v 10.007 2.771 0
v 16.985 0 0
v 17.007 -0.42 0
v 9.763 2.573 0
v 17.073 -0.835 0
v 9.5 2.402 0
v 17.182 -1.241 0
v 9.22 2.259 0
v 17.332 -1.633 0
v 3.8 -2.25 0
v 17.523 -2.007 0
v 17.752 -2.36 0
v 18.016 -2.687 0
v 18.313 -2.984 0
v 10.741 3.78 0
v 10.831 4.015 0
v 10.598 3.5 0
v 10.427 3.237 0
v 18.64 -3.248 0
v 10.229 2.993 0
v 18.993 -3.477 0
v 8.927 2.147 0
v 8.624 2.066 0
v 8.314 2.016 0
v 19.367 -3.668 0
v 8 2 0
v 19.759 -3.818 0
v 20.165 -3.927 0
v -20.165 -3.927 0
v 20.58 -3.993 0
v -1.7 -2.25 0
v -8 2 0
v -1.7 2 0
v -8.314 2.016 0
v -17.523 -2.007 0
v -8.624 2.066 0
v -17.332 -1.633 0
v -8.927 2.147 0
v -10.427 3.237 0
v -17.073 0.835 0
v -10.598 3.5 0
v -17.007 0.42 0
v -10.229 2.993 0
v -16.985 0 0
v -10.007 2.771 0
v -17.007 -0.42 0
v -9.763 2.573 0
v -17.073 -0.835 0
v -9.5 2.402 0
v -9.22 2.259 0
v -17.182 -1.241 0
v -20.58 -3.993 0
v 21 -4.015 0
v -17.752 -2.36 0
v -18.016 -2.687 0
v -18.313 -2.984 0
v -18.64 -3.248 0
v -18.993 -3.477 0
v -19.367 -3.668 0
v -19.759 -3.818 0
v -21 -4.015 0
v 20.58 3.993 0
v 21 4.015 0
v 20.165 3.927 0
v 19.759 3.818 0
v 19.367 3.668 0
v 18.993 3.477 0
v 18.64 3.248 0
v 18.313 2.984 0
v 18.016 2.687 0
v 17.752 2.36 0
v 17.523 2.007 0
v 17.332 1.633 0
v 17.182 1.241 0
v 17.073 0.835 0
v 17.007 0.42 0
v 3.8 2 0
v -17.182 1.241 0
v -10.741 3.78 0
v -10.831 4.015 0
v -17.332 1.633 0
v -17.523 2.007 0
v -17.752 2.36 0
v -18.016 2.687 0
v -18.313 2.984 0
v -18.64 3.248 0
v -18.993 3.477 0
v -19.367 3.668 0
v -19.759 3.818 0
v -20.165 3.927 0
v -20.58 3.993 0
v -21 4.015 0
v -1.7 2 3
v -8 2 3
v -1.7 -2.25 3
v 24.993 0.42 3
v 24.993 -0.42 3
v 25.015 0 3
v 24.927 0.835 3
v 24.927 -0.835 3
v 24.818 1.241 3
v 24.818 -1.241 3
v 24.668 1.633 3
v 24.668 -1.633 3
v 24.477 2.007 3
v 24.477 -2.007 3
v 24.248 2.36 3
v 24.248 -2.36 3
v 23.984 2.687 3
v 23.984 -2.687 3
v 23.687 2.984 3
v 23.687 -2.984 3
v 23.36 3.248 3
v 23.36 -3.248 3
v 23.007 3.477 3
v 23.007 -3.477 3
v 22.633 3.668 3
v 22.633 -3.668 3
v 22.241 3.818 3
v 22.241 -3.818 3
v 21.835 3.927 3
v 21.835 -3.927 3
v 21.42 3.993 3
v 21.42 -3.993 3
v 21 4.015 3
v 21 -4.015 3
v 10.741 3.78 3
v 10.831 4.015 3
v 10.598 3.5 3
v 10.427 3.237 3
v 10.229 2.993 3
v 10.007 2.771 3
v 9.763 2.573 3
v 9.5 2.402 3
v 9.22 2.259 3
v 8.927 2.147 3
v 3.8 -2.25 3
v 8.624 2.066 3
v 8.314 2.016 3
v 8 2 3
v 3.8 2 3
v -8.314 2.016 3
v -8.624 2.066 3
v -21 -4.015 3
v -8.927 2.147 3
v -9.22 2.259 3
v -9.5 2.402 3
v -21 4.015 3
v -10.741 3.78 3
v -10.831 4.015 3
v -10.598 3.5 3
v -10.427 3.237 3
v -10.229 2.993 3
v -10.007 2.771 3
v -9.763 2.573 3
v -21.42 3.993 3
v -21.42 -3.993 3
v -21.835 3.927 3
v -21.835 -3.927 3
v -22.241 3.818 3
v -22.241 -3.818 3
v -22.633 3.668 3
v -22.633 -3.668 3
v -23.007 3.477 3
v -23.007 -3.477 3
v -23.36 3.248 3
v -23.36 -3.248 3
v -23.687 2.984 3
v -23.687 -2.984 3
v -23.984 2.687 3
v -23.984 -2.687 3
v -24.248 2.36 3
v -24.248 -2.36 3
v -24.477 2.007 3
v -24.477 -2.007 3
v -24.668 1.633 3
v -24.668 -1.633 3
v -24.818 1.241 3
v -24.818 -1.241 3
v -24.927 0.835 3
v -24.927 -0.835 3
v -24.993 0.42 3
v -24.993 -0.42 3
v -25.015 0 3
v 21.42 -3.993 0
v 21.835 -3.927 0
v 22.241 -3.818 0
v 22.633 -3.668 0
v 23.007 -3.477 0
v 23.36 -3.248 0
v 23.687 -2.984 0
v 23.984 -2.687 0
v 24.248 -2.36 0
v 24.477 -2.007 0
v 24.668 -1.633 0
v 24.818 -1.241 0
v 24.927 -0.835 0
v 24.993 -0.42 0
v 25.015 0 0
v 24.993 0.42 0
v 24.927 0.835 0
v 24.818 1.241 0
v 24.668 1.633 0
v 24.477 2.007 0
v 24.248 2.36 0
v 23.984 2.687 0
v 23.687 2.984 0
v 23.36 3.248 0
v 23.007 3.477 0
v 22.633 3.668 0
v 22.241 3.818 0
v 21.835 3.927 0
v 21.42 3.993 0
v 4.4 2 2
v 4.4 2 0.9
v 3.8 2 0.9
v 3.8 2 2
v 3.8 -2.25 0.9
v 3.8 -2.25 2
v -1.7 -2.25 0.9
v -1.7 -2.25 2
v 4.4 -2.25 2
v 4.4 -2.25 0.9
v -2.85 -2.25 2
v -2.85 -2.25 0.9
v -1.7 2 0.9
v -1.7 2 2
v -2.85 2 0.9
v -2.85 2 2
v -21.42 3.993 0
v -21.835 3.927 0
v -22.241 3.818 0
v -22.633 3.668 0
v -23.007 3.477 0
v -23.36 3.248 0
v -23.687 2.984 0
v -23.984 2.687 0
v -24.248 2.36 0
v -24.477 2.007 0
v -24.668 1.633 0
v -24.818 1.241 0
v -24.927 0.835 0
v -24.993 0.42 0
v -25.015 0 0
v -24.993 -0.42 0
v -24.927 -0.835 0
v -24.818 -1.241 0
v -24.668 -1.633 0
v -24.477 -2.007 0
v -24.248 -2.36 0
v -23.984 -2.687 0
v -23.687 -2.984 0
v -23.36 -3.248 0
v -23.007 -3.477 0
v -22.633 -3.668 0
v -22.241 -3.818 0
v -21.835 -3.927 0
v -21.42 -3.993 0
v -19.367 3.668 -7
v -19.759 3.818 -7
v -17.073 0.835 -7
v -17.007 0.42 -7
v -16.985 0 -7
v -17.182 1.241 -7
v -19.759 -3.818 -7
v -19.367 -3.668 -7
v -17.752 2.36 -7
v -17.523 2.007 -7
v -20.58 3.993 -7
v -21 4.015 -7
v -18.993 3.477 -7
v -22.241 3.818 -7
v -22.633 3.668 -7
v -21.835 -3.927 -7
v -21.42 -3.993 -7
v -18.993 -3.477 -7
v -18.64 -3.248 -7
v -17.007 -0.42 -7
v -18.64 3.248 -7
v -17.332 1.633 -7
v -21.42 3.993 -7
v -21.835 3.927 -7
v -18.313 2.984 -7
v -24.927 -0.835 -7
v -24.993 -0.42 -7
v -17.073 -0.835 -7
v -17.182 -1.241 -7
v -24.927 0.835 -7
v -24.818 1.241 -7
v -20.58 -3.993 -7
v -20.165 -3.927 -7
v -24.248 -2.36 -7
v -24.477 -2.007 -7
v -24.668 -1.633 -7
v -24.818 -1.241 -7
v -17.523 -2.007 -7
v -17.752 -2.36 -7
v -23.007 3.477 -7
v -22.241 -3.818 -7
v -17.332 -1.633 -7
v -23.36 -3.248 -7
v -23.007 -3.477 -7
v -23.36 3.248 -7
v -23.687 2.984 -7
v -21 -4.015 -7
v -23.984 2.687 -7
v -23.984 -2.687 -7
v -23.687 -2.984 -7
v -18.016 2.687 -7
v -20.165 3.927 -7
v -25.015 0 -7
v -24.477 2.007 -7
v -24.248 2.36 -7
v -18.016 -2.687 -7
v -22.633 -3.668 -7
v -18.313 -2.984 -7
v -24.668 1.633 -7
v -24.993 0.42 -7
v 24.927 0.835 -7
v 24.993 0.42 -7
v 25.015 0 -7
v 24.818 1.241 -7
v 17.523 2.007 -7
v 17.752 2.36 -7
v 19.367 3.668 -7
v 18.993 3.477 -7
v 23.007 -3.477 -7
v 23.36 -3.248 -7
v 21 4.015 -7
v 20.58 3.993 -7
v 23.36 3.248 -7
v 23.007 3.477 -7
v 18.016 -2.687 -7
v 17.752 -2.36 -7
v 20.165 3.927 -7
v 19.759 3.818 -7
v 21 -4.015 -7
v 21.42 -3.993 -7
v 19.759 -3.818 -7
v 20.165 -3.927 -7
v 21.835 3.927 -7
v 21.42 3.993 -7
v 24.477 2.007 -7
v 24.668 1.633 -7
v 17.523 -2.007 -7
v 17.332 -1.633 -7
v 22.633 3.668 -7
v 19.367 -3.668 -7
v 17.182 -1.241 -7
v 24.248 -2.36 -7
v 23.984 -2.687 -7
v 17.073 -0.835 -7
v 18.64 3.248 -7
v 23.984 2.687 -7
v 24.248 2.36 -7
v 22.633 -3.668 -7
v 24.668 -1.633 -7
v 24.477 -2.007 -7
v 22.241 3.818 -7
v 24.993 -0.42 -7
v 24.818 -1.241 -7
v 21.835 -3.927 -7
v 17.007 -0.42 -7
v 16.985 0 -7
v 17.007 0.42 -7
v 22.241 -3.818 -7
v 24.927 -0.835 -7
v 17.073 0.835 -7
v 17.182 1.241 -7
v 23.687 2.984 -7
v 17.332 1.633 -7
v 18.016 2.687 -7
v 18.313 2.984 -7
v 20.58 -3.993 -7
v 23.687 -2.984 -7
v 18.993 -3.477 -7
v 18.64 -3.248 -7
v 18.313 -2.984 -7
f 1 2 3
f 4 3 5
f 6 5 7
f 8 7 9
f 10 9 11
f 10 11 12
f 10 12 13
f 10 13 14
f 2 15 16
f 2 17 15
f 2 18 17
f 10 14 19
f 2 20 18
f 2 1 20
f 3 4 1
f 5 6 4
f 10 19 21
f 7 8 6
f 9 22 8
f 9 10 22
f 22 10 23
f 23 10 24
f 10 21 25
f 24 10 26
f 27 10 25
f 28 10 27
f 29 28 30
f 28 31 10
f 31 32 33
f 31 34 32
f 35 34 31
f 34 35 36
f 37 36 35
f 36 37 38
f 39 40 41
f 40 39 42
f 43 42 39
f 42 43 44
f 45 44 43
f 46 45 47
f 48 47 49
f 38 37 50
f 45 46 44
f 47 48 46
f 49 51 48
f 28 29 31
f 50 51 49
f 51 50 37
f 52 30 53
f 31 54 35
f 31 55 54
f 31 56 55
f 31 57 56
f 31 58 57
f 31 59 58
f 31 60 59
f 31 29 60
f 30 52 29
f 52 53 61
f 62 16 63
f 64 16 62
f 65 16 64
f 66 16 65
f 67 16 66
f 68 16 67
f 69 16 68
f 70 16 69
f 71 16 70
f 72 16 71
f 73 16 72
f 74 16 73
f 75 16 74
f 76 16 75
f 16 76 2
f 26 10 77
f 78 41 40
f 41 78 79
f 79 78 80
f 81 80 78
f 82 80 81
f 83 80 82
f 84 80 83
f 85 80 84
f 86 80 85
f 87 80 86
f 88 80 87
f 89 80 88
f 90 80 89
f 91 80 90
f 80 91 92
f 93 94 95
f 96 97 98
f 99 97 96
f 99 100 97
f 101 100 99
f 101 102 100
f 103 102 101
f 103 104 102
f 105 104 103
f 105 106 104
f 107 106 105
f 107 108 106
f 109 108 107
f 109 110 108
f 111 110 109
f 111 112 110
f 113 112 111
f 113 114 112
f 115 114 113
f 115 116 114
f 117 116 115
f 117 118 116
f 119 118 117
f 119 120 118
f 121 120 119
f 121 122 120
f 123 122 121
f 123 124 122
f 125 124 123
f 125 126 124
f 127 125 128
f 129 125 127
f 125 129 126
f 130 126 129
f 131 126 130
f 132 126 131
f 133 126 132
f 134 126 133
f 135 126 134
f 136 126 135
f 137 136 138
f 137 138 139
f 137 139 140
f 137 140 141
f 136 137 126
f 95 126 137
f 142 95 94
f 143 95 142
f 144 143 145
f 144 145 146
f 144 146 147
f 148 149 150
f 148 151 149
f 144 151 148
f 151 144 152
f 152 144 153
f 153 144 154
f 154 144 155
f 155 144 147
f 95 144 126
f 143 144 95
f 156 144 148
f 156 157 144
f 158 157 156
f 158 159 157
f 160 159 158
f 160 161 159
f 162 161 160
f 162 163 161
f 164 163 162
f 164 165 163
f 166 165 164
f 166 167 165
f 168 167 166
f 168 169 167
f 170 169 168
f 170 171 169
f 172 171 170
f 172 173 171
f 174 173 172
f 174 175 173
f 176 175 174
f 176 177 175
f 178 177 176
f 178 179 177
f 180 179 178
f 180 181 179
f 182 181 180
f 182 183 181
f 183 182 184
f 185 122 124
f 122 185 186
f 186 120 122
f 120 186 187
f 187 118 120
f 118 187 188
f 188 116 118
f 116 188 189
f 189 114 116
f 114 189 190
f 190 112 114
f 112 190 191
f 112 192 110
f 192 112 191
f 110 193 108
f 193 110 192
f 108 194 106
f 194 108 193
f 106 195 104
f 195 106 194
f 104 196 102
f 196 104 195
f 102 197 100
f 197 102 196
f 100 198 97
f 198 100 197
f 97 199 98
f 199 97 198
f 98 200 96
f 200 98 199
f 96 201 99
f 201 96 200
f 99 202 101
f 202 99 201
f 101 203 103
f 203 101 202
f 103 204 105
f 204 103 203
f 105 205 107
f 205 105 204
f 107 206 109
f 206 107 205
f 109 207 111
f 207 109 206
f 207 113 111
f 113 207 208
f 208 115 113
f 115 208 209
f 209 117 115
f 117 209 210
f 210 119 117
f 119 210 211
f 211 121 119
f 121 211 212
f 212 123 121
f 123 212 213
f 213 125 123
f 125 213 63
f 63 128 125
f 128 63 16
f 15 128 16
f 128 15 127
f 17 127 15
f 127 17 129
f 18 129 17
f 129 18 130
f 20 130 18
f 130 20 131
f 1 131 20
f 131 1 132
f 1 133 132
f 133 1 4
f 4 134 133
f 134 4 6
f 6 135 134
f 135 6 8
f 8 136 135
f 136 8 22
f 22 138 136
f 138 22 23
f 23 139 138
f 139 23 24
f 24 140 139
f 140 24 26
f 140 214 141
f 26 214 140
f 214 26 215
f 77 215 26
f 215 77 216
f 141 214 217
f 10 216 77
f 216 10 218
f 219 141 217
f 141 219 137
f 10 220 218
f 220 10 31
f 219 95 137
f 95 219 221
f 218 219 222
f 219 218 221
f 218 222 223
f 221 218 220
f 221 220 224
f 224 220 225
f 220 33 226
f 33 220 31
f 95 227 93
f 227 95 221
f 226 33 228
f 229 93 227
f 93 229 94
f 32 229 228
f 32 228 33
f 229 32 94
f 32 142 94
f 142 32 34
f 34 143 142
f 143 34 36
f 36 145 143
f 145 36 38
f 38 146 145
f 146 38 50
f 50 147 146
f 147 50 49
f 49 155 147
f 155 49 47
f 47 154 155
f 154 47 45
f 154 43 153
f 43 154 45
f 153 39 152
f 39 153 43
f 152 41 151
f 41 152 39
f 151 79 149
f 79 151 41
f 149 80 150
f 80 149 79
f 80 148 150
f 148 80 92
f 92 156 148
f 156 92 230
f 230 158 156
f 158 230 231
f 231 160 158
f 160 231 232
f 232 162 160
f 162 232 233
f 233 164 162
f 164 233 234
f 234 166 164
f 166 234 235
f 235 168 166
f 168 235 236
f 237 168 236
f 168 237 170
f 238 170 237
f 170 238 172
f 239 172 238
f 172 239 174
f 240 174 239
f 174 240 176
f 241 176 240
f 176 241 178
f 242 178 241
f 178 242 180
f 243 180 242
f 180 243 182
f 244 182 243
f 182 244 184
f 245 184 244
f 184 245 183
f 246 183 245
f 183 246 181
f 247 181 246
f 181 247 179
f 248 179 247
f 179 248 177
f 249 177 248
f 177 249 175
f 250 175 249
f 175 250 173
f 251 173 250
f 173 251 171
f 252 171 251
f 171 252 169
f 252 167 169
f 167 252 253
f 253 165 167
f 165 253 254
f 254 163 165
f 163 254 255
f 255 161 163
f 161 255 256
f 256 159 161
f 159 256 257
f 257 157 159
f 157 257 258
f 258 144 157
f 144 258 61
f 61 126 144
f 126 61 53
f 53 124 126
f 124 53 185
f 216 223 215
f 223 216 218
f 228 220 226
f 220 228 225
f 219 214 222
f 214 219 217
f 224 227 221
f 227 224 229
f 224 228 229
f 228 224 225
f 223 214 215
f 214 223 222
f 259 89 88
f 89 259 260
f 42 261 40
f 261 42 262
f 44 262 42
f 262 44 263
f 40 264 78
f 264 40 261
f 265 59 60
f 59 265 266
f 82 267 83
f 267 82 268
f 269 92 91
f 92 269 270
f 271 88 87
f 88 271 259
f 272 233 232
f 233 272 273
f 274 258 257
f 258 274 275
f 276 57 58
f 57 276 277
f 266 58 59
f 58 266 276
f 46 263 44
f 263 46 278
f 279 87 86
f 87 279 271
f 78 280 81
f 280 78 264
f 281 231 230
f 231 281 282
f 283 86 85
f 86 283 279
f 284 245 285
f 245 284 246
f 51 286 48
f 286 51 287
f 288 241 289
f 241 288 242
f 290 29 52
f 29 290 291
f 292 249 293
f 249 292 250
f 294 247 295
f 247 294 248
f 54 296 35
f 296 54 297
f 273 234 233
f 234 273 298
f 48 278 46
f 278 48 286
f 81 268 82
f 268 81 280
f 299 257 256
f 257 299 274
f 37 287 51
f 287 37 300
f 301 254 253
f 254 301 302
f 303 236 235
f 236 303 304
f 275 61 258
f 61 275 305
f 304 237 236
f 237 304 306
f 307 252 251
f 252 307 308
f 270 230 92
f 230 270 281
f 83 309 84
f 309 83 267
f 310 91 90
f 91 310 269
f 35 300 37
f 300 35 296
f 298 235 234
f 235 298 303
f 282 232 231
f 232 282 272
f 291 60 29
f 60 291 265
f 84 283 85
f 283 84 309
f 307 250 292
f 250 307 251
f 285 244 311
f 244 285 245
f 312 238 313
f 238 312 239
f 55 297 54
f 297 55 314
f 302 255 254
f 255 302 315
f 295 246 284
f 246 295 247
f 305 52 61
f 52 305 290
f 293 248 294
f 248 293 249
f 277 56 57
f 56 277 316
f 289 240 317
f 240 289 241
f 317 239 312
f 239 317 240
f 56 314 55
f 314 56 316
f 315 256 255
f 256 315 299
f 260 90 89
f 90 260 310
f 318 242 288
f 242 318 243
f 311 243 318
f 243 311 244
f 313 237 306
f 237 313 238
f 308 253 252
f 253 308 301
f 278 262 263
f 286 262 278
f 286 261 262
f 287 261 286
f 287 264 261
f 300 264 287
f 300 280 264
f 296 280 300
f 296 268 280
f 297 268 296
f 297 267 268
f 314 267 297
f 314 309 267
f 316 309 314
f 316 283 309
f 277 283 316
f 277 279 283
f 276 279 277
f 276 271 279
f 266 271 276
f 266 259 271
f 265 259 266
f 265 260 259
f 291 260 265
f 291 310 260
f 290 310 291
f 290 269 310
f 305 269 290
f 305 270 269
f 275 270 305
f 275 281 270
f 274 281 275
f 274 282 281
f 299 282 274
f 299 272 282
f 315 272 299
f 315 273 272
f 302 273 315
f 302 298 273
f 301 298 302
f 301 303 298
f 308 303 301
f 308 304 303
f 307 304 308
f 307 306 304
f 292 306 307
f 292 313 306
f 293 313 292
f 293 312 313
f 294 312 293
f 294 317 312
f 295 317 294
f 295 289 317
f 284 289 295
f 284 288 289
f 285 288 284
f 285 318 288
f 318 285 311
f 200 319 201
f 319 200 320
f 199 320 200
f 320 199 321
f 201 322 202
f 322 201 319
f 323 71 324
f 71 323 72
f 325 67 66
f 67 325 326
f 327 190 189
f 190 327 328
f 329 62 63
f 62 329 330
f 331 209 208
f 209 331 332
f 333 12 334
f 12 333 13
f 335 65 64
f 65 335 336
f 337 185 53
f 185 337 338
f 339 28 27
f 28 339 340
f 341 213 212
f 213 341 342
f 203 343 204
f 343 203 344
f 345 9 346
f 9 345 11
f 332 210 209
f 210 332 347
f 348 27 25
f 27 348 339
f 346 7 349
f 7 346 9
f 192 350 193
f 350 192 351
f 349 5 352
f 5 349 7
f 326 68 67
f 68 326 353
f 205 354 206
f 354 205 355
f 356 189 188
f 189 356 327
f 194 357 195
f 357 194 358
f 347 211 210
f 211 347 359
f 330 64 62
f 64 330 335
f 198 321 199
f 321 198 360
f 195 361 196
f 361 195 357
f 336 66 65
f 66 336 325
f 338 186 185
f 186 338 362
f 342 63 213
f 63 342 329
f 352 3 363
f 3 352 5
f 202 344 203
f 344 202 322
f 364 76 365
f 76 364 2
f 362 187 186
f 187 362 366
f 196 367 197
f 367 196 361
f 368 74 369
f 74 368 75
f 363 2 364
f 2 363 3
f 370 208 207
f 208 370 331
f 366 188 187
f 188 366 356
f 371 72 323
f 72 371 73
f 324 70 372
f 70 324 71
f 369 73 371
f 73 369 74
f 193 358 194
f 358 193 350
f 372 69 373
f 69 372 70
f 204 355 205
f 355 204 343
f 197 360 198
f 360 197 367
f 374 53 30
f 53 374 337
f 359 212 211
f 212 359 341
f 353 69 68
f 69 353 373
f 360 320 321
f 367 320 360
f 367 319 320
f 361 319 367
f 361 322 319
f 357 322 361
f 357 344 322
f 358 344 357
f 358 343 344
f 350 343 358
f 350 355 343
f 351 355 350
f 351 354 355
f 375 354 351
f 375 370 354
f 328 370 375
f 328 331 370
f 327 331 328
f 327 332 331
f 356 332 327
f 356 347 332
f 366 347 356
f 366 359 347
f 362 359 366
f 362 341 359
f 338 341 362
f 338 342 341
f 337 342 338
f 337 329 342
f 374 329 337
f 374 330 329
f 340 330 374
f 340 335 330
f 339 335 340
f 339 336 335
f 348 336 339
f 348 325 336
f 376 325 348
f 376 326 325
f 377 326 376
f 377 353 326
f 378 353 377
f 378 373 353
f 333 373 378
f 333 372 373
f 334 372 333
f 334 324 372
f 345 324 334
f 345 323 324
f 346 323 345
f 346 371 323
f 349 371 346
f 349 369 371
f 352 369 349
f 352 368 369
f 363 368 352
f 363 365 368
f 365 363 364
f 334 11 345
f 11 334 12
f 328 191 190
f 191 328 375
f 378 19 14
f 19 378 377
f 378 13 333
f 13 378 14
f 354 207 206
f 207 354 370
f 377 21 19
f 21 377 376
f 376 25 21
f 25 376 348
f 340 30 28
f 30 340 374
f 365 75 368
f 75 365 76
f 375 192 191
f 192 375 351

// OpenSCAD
// A bracket to mount bushings to the DFRobot FIT0708 stepper motor.

cv = 5;
$fn = 60;

weightCenters = 21;
weightStems = 8.03;

// The bracket itself, for design or printing
if(1) bracket();

// Reference parts
// The threaded tongue/bolt from the motor, that the bracket fits over
if(0) translate([0,0,0.9]) color("yellow") tongue();
// The bushings
if(0) translate([0,0,3]) {
  for(i=[-1,1]) translate([i*weightCenters,0,j*7.1]) {
    color("teal") bushing();
  }
}


module bracket() {
  difference() {
    
    linear_extrude(3,convexity=cv) {
      difference() {
        hull() {
          for(i=[-1,1]) translate([i*(weightCenters),0]) circle(d=weightStems);
        }
        translate([0,2]) hull(){
          for(i=[-1,1]) translate([i*8,3]) circle(d=6,$fn=60);
        }
        translate([-1.7,-4.5/2]) square([5.5,10]);
      }
    }

    translate([0,0,0.9]) tongue();
  }
  for(i=[-1,1]) translate([i*weightCenters,0,-7]) cylinder(d=weightStems,h=7);
}

module tongue(removeHoles=false) {
   {
    //7.15, centerline 2.85, depth 4.5, height 1.1
    linear_extrude(1.1,convexity=cv) {
      difference() {
        translate([-2.85,-4.5/2]) square([7.25,4.5]);
        if(!removeHoles) {
          circle(d=2,$fn=24);
          translate([2.5,0]) circle(d=1.6,$fn=24);
        }
      }
    }
  }
}

module bushing() {
  {
    linear_extrude(7,convexity=cv) {
      difference() {
        circle(d=22);
        circle(d=8);
      }
    }
  }
}
